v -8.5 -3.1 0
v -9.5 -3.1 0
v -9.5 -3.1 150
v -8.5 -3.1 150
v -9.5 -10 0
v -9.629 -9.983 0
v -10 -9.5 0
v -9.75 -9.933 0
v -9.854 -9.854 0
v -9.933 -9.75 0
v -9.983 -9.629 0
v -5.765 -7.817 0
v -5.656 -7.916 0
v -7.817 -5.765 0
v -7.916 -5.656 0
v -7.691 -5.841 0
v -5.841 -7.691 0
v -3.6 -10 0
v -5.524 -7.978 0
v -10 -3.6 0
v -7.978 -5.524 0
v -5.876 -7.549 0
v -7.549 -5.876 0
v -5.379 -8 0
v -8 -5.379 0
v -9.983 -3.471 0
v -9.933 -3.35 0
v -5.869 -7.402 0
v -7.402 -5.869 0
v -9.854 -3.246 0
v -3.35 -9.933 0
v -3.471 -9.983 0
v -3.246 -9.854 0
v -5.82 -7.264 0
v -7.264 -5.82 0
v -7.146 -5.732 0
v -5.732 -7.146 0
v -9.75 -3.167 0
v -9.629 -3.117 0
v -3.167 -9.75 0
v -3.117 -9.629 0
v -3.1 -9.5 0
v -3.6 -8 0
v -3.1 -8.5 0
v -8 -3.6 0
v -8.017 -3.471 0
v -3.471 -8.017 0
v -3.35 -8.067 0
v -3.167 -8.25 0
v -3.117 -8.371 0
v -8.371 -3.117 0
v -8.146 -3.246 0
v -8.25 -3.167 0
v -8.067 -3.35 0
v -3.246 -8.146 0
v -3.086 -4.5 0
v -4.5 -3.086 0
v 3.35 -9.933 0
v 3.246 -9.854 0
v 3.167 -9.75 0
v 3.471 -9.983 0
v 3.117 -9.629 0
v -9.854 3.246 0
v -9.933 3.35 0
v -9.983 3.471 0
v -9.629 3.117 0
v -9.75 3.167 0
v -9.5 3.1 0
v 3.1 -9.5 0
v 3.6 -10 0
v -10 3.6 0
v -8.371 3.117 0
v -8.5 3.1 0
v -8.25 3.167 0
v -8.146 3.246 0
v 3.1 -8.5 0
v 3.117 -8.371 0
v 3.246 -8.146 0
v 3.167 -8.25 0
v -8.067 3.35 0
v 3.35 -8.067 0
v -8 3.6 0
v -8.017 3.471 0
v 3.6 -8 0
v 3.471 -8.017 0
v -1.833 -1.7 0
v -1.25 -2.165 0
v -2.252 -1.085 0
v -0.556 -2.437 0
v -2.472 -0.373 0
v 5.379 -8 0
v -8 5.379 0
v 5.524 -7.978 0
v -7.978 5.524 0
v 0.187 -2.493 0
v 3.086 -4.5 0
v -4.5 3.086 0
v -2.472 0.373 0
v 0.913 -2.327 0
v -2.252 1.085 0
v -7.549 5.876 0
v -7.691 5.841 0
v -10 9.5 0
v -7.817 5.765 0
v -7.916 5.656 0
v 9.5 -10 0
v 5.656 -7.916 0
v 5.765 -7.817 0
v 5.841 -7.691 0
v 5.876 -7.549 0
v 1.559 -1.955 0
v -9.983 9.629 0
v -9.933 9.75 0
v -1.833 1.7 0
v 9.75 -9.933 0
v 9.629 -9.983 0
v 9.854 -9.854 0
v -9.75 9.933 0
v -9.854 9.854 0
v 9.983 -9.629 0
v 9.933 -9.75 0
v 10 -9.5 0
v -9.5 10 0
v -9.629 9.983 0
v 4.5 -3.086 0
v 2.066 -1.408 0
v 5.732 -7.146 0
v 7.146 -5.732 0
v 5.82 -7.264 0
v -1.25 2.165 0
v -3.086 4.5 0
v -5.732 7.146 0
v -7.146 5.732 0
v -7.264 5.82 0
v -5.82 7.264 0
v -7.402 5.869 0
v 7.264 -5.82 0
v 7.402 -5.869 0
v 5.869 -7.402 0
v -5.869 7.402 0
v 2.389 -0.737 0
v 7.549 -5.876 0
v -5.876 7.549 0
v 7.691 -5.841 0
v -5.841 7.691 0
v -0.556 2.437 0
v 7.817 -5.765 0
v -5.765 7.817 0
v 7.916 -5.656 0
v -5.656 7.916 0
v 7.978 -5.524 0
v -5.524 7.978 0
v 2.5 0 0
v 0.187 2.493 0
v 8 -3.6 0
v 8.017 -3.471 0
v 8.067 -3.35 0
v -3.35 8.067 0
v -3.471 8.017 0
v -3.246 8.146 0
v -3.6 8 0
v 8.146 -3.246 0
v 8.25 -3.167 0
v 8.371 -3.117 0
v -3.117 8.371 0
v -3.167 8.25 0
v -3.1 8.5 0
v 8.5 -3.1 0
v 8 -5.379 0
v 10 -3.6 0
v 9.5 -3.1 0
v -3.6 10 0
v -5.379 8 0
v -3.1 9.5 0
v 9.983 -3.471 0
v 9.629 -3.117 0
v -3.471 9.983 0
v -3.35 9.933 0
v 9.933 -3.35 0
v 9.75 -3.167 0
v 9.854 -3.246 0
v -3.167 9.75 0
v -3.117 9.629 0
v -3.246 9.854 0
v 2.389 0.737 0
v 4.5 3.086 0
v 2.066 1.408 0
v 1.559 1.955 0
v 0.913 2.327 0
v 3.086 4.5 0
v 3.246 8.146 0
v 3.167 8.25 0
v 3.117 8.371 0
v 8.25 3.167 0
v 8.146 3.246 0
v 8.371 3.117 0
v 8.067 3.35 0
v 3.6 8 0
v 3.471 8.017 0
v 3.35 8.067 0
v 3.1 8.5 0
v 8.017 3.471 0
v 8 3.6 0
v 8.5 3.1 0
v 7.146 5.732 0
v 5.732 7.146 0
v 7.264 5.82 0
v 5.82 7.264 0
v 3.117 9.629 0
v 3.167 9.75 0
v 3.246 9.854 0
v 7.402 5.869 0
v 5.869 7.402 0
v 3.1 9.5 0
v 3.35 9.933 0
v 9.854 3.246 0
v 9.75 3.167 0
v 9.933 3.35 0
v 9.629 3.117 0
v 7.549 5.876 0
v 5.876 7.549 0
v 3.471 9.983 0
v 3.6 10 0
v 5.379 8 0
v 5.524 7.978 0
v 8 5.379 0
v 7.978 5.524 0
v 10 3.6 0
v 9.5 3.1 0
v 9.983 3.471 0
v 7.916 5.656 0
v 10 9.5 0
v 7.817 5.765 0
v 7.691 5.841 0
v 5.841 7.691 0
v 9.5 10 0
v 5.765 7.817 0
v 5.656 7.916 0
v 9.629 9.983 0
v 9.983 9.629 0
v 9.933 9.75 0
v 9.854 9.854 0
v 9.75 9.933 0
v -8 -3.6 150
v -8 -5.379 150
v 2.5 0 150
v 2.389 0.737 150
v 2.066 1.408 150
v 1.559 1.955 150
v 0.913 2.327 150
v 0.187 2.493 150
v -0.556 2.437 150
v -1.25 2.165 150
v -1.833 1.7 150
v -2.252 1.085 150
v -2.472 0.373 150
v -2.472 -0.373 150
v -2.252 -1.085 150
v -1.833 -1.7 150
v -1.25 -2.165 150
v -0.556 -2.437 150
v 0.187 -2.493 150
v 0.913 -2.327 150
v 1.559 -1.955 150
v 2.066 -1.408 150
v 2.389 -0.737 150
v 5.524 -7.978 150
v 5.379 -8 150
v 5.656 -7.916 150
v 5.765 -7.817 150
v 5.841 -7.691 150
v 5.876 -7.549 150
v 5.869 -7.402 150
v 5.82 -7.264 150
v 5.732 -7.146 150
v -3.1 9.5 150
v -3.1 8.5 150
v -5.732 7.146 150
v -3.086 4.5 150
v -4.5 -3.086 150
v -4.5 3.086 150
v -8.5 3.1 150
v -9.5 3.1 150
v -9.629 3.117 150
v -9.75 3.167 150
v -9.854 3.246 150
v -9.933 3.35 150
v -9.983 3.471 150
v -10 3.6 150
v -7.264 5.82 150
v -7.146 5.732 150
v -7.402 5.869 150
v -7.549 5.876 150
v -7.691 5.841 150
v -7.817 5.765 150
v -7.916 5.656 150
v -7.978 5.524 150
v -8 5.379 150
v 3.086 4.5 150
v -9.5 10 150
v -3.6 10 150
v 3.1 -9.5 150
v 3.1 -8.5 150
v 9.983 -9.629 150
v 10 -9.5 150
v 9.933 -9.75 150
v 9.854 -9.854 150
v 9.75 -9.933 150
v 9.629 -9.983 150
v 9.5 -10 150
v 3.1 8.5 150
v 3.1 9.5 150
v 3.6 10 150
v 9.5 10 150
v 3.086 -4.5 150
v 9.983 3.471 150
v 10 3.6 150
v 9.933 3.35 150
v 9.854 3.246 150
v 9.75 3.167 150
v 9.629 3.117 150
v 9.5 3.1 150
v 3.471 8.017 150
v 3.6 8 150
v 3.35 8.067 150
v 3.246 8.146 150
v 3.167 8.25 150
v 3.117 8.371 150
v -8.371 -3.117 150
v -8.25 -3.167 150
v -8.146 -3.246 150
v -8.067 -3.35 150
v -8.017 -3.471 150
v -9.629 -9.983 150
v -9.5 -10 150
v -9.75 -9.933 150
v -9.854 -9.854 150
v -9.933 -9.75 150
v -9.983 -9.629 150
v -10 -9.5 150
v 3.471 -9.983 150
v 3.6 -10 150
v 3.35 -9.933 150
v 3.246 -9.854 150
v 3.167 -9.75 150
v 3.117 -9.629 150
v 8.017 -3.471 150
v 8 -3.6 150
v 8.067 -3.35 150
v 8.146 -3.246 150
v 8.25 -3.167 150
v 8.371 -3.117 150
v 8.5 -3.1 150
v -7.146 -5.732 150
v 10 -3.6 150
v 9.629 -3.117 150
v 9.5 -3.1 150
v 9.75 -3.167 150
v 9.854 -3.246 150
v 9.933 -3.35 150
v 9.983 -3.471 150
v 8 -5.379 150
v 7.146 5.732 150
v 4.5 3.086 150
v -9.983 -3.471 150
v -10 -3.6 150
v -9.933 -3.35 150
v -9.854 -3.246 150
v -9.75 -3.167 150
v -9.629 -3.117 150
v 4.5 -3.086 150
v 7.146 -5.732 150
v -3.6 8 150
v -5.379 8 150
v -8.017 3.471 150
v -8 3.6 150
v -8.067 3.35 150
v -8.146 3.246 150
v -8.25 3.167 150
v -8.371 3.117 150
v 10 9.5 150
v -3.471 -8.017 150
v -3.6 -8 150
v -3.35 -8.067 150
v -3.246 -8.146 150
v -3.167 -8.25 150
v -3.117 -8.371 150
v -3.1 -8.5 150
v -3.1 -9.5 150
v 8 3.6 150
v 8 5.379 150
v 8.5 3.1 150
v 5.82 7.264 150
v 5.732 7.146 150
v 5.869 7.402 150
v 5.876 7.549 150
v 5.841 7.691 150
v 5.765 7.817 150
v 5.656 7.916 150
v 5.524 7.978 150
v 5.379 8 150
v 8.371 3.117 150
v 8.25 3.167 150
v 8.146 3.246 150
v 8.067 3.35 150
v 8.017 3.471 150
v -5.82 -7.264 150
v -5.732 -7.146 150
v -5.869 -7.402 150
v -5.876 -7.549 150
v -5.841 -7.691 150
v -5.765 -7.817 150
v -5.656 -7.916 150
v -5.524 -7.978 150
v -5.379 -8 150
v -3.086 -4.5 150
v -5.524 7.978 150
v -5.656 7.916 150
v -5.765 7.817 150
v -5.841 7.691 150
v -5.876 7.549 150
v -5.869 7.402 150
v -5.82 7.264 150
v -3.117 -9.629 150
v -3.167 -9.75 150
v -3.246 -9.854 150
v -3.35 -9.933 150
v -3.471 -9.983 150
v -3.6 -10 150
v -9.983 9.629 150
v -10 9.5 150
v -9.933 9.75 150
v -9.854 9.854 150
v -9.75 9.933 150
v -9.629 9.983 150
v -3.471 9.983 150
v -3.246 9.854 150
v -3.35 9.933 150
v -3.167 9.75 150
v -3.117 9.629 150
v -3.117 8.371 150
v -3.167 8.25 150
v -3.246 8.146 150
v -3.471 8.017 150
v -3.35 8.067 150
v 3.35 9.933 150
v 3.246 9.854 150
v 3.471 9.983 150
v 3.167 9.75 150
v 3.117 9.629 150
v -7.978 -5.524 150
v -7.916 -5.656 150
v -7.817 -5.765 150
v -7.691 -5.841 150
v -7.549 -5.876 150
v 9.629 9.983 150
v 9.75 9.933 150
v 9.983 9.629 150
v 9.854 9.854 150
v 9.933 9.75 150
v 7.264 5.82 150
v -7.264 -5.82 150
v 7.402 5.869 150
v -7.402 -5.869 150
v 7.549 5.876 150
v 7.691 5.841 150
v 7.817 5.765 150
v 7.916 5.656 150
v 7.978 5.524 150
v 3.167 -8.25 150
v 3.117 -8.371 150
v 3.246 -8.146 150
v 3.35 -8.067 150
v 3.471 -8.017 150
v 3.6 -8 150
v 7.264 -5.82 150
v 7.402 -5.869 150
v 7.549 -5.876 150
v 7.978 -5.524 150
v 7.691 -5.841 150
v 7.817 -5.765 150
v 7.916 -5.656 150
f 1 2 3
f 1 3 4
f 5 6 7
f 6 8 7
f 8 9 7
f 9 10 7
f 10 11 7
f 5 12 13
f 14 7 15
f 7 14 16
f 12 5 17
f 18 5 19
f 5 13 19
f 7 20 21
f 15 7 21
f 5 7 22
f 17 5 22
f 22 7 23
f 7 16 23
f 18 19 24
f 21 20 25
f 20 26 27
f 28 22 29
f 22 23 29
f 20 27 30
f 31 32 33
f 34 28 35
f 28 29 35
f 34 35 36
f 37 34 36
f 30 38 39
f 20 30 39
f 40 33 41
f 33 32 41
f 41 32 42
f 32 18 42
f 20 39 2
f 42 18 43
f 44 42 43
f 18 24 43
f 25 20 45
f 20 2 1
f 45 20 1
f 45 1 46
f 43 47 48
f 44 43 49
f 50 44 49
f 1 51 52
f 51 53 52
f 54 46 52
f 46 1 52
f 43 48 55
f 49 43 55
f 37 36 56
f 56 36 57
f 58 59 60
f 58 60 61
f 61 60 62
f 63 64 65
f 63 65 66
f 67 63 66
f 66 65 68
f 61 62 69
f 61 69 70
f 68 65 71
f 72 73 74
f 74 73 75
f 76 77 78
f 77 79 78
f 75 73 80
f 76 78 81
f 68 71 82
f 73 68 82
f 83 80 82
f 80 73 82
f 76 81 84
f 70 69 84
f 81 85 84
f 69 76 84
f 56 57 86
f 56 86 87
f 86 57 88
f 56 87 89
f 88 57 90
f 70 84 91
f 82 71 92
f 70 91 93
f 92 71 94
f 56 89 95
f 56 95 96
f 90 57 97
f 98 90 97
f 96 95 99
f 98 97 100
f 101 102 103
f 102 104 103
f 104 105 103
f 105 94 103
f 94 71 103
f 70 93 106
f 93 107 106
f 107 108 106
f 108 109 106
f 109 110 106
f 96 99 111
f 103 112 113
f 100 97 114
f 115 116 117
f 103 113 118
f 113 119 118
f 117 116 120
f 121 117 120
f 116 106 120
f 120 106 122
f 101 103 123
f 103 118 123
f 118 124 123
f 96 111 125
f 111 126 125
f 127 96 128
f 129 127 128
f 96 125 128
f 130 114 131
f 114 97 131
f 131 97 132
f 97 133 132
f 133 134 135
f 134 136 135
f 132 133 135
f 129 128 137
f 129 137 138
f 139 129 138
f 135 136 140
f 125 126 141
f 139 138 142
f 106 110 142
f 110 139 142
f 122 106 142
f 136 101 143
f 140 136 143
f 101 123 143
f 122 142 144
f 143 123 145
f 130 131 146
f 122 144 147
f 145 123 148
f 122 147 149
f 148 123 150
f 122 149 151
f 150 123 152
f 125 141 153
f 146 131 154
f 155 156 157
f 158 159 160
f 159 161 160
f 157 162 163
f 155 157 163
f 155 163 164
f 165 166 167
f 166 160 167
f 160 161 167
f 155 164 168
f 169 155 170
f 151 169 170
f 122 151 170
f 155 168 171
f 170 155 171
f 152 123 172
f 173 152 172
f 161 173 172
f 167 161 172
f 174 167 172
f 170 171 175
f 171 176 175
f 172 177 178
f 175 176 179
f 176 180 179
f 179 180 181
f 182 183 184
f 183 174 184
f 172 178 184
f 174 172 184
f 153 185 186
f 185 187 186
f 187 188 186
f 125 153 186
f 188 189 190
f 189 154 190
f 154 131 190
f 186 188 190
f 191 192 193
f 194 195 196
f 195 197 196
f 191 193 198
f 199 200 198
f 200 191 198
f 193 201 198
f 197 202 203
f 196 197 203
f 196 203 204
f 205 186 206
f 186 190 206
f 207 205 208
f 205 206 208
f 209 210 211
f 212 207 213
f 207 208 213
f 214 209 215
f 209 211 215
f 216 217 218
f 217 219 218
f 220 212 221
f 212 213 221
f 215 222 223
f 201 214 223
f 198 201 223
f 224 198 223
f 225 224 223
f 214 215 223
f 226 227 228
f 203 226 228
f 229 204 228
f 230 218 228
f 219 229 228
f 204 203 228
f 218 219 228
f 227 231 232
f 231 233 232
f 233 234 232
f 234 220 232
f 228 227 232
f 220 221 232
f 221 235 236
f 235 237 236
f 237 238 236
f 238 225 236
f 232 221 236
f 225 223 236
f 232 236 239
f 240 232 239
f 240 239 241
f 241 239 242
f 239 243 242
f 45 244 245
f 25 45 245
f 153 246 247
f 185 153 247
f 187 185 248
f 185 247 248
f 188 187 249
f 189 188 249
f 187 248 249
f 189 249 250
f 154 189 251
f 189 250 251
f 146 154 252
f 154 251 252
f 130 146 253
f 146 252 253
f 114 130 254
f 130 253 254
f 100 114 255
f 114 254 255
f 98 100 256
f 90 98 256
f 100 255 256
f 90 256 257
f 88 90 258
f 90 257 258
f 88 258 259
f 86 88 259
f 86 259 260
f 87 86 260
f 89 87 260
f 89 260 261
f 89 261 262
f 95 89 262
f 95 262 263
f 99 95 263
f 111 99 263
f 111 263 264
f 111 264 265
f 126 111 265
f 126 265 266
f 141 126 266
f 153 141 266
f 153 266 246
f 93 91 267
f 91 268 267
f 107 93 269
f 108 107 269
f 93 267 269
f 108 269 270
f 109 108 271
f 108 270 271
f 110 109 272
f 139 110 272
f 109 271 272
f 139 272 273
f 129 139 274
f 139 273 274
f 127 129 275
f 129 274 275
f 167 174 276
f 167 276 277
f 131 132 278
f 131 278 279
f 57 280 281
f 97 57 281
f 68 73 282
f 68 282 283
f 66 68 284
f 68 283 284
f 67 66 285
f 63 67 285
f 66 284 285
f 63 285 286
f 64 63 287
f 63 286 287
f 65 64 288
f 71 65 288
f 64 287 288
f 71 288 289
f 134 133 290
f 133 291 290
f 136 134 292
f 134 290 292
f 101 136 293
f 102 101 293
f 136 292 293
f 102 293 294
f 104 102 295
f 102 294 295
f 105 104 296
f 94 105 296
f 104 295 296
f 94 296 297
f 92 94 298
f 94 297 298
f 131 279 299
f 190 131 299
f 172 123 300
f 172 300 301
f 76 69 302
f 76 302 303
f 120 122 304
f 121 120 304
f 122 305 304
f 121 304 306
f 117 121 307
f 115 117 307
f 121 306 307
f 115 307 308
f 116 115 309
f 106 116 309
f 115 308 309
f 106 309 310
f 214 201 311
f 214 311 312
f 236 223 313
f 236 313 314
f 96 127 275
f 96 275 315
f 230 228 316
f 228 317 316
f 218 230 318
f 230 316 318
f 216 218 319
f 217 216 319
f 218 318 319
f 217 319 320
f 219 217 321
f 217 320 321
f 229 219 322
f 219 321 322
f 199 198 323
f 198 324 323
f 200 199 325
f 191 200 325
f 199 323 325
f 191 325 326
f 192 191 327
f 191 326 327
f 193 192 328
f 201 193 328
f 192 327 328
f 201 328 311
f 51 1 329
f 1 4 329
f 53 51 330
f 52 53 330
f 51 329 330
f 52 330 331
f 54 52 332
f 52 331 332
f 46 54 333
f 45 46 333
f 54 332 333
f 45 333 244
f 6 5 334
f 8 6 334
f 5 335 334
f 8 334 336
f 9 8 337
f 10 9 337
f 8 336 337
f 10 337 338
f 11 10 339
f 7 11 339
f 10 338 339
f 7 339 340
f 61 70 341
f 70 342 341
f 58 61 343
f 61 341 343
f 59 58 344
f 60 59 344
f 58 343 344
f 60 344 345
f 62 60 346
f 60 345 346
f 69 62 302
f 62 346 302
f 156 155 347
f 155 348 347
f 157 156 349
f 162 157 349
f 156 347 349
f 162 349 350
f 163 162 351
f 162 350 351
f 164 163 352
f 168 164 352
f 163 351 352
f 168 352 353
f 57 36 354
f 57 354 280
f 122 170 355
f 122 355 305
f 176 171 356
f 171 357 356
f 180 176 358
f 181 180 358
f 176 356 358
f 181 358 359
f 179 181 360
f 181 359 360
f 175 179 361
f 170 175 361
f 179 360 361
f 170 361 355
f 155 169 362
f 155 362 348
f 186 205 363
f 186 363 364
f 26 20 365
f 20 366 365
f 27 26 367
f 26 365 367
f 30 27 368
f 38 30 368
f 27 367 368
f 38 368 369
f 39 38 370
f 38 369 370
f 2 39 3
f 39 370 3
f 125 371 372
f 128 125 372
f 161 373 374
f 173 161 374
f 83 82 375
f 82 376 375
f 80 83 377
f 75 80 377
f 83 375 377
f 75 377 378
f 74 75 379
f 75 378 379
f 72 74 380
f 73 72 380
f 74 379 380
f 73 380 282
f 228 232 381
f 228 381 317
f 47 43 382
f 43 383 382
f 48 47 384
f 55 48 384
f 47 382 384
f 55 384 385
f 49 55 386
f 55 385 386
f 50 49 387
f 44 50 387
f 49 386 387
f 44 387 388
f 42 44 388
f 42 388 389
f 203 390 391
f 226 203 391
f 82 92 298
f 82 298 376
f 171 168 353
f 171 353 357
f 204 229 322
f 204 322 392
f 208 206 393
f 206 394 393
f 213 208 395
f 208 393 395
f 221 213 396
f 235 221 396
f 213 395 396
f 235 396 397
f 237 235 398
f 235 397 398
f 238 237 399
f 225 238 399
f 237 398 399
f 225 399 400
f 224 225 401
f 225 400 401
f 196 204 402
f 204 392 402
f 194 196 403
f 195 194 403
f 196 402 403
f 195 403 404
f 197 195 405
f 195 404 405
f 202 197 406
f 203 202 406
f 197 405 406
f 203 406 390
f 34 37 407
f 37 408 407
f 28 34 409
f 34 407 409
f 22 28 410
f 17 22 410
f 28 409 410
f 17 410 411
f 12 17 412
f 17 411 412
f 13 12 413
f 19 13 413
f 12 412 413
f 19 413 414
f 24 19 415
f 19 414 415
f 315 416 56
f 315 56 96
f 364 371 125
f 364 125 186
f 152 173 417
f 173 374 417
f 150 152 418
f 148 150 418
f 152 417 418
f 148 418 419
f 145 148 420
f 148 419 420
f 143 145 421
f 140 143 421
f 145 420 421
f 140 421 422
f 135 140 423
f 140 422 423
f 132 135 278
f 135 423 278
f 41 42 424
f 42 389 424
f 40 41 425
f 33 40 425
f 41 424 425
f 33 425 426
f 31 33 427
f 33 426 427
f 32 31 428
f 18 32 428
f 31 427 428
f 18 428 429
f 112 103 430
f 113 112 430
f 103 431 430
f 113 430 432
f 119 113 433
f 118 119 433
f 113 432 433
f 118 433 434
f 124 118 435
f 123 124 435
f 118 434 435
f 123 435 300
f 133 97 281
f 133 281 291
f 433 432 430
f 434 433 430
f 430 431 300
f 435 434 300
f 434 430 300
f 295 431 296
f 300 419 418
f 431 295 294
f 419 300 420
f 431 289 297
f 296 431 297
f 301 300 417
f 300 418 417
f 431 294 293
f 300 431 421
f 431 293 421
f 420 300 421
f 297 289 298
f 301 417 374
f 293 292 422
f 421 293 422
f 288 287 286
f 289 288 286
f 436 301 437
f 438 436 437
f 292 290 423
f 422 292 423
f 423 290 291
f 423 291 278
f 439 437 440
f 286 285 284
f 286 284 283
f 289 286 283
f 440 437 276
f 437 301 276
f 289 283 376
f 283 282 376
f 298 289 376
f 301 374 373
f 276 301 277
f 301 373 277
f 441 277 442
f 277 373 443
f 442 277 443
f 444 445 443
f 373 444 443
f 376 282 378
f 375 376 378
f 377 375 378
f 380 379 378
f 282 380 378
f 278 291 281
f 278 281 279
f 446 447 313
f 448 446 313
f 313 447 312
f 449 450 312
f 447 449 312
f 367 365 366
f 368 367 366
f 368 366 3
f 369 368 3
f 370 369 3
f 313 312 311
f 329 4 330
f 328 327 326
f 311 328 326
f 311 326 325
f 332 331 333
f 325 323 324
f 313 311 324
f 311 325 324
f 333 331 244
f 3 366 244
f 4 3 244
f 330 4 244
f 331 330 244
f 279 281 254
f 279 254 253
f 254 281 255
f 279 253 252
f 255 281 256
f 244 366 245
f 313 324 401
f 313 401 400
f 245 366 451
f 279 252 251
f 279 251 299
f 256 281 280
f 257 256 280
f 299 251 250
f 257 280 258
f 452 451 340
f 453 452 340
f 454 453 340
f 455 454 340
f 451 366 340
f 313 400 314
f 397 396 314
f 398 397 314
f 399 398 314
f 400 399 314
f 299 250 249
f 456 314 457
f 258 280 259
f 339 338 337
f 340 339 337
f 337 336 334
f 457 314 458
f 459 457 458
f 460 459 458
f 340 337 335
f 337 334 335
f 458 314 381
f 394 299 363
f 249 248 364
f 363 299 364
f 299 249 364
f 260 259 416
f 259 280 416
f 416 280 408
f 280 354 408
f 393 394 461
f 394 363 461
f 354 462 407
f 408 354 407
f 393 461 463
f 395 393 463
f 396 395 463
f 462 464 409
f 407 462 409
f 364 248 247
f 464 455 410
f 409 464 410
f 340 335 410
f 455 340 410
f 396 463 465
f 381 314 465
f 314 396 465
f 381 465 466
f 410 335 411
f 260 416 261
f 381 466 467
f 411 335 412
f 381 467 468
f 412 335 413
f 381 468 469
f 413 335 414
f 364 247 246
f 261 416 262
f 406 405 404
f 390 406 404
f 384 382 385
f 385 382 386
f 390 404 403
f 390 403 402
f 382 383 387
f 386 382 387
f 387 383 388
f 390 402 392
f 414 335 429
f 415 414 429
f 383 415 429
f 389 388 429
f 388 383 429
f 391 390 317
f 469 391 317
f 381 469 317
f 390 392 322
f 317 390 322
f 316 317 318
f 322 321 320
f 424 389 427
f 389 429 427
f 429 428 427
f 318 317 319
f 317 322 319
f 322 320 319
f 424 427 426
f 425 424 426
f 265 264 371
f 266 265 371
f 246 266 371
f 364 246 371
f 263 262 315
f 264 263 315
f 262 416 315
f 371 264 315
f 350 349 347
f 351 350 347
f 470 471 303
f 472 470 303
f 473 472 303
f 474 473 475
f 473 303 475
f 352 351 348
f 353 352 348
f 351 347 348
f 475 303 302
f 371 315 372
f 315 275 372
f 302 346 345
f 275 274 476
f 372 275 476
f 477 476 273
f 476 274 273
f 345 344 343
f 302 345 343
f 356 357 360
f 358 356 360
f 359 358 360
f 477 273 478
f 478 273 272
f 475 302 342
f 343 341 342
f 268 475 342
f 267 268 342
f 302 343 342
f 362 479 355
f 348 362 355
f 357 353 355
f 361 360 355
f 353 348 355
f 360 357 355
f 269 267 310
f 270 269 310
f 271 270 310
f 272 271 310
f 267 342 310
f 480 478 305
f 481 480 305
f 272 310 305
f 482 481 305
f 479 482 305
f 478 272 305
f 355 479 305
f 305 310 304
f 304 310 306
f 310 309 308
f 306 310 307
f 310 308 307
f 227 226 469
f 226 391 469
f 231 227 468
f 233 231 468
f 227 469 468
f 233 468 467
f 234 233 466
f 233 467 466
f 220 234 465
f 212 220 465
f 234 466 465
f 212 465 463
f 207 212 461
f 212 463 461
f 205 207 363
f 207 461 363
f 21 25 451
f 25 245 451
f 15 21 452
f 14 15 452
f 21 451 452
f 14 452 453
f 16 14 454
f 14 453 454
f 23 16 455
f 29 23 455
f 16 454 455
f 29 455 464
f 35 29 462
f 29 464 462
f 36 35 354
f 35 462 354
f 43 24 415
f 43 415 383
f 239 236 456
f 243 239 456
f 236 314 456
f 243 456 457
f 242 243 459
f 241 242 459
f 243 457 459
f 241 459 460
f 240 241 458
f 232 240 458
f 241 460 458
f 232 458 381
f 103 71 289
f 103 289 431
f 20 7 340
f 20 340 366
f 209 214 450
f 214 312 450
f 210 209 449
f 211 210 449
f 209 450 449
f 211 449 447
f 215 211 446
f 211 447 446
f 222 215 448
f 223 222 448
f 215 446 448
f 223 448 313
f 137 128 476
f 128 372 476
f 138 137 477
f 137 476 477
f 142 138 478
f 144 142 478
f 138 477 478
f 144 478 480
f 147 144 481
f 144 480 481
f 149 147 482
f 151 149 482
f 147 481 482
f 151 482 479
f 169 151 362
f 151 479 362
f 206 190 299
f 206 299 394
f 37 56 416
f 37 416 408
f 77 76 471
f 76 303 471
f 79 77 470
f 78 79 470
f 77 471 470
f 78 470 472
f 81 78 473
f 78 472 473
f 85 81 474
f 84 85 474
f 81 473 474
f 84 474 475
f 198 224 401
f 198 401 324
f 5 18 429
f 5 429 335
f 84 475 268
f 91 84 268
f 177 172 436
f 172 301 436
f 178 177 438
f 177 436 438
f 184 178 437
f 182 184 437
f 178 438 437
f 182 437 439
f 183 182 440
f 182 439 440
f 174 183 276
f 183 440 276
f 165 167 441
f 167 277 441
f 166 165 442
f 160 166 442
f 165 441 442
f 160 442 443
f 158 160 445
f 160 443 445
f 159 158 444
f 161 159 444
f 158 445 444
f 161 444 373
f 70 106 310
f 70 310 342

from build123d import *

# Parameters (mm, degrees)
AUFSATZ_LINEAR_AUSTRAGEN1_DEPTH = 150
VERRUNDUNG1_R                   = 0.5
KREISMUSTER1_COUNT              = 4
SKIZZE3_W                       = 9
SKIZZE3_H                       = 9
AUFSATZ_LINEAR_AUSTRAGEN2_DEPTH = 150
SKIZZE4_R                       = 2.5
SCHNITT_LINEAR_AUSTRAGEN1_DEPTH = 151


with BuildPart() as part:
    # Skizze1 → Aufsatz-Linear austragen1 (new body)
    with BuildSketch(Plane.XY):
        Polygon((-0.707106781, 0.707106781), (6.585786438, 8), (3.1, 8), (3.1, 10), (10, 10), (10, 3.1), (8, 3.1), (8, 6.585786438), (0.707106781, -0.707106781), align=None)
    extrude(amount=AUFSATZ_LINEAR_AUSTRAGEN1_DEPTH)

    # Verrundung1
    verrundung1_edges = [part.edges().sort_by_distance(p)[0] for p in [
        (10, 3.1, 75),
        (8, 3.1, 75),
        (8, 6.585786438, 75),
        (6.585786438, 8, 75),
        (3.1, 8, 75),
        (3.1, 10, 75),
        (10, 10, 75),
    ]]
    fillet(verrundung1_edges, radius=VERRUNDUNG1_R)

    # Kreismuster1: part ×4 about axis
    kreismuster1_axis = Axis((0, 0, 0), (0, 0, 1))


with BuildPart() as part_1:
    add(part.part)
    for i in range(1, KREISMUSTER1_COUNT):
        add(part.part.rotate(kreismuster1_axis, i * 360 / KREISMUSTER1_COUNT))

    # Skizze3 → Aufsatz-Linear austragen2 (add)
    with BuildSketch(Plane.XY.offset(150)):
        Rectangle(SKIZZE3_W, SKIZZE3_H)
    extrude(amount=-AUFSATZ_LINEAR_AUSTRAGEN2_DEPTH)

    # Skizze4 → Schnitt-Linear austragen1 (cut, through all)
    with BuildSketch(Plane.XY.offset(150)):
        Circle(SKIZZE4_R)
    extrude(amount=-SCHNITT_LINEAR_AUSTRAGEN1_DEPTH, mode=Mode.SUBTRACT)


solid = part_1.part
